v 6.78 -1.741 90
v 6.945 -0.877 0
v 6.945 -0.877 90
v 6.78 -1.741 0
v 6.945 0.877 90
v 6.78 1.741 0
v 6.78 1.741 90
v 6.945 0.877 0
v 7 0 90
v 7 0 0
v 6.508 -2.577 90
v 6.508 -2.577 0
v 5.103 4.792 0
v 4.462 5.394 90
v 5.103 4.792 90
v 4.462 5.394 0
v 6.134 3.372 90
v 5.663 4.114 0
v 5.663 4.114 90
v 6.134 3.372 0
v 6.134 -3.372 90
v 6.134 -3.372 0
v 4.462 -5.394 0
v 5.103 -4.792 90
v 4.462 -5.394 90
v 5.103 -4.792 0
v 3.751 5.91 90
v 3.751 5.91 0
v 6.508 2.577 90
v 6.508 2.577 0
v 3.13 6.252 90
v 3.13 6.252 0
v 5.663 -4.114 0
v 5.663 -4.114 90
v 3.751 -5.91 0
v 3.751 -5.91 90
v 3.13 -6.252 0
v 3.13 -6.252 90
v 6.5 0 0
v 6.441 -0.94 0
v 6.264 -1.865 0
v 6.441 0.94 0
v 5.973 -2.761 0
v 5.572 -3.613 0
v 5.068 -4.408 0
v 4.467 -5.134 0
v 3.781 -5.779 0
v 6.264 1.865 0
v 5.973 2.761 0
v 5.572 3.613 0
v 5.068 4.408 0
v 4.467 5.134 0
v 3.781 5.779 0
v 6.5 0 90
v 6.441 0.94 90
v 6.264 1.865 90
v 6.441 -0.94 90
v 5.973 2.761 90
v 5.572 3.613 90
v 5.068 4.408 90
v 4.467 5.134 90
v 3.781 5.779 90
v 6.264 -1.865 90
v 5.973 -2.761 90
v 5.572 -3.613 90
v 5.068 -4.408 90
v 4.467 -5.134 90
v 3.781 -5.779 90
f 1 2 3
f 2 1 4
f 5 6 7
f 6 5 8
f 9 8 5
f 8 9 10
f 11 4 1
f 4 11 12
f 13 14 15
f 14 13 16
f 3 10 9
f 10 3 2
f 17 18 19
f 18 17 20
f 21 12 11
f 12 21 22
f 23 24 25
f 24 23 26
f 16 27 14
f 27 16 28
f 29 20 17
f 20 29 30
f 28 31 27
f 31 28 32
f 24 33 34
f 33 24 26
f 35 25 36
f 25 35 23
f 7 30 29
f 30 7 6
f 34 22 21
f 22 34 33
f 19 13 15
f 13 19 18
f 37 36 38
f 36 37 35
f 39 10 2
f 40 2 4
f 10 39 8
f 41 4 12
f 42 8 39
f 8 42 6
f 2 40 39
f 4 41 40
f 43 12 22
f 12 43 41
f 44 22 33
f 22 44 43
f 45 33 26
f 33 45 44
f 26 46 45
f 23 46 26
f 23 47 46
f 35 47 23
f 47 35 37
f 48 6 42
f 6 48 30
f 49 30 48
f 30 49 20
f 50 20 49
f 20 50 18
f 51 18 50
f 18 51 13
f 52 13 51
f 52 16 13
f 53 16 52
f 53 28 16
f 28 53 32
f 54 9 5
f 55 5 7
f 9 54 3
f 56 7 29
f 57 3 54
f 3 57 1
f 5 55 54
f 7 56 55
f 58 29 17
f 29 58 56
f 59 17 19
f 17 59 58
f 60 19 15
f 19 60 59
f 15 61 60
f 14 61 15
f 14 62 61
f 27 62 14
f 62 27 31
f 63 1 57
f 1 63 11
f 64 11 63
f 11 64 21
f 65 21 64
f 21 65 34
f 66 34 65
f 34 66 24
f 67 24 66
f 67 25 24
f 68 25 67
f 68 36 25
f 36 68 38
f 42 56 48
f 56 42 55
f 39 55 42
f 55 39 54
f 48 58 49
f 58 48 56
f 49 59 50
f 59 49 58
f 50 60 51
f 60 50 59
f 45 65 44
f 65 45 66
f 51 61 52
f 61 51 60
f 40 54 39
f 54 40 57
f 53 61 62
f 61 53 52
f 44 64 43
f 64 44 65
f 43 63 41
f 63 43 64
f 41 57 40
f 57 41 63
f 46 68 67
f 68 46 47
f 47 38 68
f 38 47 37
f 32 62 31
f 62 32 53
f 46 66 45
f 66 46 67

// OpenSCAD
$fn = 50;


difference() {
	union() {
		cylinder(h = 90, r = 7.0000000000);
		translate(v = [-4.0000000000, 0, 0]) {
			cylinder(h = 90, r = 7.0000000000);
		}
	}
	union() {
		cylinder(h = 90, r = 3.2500000000);
		cylinder(h = 90, r = 1.8000000000);
		cylinder(h = 90, r = 1.8000000000);
		cylinder(h = 90, r = 1.8000000000);
		translate(v = [-8.5000000000, 0, 0]) {
			hull() {
				translate(v = [-3.7500000000, 0.0000000000, 0]) {
					cylinder(h = 90, r = 7.5000000000);
				}
				translate(v = [3.7500000000, 0.0000000000, 0]) {
					cylinder(h = 90, r = 7.5000000000);
				}
				translate(v = [-3.7500000000, -0.0000000000, 0]) {
					cylinder(h = 90, r = 7.5000000000);
				}
				translate(v = [3.7500000000, -0.0000000000, 0]) {
					cylinder(h = 90, r = 7.5000000000);
				}
			}
		}
		translate(v = [-1.0000000000, 0, 0.0000000000]) {
			cylinder(h = 90, r = 7.5000000000);
		}
	}
}
